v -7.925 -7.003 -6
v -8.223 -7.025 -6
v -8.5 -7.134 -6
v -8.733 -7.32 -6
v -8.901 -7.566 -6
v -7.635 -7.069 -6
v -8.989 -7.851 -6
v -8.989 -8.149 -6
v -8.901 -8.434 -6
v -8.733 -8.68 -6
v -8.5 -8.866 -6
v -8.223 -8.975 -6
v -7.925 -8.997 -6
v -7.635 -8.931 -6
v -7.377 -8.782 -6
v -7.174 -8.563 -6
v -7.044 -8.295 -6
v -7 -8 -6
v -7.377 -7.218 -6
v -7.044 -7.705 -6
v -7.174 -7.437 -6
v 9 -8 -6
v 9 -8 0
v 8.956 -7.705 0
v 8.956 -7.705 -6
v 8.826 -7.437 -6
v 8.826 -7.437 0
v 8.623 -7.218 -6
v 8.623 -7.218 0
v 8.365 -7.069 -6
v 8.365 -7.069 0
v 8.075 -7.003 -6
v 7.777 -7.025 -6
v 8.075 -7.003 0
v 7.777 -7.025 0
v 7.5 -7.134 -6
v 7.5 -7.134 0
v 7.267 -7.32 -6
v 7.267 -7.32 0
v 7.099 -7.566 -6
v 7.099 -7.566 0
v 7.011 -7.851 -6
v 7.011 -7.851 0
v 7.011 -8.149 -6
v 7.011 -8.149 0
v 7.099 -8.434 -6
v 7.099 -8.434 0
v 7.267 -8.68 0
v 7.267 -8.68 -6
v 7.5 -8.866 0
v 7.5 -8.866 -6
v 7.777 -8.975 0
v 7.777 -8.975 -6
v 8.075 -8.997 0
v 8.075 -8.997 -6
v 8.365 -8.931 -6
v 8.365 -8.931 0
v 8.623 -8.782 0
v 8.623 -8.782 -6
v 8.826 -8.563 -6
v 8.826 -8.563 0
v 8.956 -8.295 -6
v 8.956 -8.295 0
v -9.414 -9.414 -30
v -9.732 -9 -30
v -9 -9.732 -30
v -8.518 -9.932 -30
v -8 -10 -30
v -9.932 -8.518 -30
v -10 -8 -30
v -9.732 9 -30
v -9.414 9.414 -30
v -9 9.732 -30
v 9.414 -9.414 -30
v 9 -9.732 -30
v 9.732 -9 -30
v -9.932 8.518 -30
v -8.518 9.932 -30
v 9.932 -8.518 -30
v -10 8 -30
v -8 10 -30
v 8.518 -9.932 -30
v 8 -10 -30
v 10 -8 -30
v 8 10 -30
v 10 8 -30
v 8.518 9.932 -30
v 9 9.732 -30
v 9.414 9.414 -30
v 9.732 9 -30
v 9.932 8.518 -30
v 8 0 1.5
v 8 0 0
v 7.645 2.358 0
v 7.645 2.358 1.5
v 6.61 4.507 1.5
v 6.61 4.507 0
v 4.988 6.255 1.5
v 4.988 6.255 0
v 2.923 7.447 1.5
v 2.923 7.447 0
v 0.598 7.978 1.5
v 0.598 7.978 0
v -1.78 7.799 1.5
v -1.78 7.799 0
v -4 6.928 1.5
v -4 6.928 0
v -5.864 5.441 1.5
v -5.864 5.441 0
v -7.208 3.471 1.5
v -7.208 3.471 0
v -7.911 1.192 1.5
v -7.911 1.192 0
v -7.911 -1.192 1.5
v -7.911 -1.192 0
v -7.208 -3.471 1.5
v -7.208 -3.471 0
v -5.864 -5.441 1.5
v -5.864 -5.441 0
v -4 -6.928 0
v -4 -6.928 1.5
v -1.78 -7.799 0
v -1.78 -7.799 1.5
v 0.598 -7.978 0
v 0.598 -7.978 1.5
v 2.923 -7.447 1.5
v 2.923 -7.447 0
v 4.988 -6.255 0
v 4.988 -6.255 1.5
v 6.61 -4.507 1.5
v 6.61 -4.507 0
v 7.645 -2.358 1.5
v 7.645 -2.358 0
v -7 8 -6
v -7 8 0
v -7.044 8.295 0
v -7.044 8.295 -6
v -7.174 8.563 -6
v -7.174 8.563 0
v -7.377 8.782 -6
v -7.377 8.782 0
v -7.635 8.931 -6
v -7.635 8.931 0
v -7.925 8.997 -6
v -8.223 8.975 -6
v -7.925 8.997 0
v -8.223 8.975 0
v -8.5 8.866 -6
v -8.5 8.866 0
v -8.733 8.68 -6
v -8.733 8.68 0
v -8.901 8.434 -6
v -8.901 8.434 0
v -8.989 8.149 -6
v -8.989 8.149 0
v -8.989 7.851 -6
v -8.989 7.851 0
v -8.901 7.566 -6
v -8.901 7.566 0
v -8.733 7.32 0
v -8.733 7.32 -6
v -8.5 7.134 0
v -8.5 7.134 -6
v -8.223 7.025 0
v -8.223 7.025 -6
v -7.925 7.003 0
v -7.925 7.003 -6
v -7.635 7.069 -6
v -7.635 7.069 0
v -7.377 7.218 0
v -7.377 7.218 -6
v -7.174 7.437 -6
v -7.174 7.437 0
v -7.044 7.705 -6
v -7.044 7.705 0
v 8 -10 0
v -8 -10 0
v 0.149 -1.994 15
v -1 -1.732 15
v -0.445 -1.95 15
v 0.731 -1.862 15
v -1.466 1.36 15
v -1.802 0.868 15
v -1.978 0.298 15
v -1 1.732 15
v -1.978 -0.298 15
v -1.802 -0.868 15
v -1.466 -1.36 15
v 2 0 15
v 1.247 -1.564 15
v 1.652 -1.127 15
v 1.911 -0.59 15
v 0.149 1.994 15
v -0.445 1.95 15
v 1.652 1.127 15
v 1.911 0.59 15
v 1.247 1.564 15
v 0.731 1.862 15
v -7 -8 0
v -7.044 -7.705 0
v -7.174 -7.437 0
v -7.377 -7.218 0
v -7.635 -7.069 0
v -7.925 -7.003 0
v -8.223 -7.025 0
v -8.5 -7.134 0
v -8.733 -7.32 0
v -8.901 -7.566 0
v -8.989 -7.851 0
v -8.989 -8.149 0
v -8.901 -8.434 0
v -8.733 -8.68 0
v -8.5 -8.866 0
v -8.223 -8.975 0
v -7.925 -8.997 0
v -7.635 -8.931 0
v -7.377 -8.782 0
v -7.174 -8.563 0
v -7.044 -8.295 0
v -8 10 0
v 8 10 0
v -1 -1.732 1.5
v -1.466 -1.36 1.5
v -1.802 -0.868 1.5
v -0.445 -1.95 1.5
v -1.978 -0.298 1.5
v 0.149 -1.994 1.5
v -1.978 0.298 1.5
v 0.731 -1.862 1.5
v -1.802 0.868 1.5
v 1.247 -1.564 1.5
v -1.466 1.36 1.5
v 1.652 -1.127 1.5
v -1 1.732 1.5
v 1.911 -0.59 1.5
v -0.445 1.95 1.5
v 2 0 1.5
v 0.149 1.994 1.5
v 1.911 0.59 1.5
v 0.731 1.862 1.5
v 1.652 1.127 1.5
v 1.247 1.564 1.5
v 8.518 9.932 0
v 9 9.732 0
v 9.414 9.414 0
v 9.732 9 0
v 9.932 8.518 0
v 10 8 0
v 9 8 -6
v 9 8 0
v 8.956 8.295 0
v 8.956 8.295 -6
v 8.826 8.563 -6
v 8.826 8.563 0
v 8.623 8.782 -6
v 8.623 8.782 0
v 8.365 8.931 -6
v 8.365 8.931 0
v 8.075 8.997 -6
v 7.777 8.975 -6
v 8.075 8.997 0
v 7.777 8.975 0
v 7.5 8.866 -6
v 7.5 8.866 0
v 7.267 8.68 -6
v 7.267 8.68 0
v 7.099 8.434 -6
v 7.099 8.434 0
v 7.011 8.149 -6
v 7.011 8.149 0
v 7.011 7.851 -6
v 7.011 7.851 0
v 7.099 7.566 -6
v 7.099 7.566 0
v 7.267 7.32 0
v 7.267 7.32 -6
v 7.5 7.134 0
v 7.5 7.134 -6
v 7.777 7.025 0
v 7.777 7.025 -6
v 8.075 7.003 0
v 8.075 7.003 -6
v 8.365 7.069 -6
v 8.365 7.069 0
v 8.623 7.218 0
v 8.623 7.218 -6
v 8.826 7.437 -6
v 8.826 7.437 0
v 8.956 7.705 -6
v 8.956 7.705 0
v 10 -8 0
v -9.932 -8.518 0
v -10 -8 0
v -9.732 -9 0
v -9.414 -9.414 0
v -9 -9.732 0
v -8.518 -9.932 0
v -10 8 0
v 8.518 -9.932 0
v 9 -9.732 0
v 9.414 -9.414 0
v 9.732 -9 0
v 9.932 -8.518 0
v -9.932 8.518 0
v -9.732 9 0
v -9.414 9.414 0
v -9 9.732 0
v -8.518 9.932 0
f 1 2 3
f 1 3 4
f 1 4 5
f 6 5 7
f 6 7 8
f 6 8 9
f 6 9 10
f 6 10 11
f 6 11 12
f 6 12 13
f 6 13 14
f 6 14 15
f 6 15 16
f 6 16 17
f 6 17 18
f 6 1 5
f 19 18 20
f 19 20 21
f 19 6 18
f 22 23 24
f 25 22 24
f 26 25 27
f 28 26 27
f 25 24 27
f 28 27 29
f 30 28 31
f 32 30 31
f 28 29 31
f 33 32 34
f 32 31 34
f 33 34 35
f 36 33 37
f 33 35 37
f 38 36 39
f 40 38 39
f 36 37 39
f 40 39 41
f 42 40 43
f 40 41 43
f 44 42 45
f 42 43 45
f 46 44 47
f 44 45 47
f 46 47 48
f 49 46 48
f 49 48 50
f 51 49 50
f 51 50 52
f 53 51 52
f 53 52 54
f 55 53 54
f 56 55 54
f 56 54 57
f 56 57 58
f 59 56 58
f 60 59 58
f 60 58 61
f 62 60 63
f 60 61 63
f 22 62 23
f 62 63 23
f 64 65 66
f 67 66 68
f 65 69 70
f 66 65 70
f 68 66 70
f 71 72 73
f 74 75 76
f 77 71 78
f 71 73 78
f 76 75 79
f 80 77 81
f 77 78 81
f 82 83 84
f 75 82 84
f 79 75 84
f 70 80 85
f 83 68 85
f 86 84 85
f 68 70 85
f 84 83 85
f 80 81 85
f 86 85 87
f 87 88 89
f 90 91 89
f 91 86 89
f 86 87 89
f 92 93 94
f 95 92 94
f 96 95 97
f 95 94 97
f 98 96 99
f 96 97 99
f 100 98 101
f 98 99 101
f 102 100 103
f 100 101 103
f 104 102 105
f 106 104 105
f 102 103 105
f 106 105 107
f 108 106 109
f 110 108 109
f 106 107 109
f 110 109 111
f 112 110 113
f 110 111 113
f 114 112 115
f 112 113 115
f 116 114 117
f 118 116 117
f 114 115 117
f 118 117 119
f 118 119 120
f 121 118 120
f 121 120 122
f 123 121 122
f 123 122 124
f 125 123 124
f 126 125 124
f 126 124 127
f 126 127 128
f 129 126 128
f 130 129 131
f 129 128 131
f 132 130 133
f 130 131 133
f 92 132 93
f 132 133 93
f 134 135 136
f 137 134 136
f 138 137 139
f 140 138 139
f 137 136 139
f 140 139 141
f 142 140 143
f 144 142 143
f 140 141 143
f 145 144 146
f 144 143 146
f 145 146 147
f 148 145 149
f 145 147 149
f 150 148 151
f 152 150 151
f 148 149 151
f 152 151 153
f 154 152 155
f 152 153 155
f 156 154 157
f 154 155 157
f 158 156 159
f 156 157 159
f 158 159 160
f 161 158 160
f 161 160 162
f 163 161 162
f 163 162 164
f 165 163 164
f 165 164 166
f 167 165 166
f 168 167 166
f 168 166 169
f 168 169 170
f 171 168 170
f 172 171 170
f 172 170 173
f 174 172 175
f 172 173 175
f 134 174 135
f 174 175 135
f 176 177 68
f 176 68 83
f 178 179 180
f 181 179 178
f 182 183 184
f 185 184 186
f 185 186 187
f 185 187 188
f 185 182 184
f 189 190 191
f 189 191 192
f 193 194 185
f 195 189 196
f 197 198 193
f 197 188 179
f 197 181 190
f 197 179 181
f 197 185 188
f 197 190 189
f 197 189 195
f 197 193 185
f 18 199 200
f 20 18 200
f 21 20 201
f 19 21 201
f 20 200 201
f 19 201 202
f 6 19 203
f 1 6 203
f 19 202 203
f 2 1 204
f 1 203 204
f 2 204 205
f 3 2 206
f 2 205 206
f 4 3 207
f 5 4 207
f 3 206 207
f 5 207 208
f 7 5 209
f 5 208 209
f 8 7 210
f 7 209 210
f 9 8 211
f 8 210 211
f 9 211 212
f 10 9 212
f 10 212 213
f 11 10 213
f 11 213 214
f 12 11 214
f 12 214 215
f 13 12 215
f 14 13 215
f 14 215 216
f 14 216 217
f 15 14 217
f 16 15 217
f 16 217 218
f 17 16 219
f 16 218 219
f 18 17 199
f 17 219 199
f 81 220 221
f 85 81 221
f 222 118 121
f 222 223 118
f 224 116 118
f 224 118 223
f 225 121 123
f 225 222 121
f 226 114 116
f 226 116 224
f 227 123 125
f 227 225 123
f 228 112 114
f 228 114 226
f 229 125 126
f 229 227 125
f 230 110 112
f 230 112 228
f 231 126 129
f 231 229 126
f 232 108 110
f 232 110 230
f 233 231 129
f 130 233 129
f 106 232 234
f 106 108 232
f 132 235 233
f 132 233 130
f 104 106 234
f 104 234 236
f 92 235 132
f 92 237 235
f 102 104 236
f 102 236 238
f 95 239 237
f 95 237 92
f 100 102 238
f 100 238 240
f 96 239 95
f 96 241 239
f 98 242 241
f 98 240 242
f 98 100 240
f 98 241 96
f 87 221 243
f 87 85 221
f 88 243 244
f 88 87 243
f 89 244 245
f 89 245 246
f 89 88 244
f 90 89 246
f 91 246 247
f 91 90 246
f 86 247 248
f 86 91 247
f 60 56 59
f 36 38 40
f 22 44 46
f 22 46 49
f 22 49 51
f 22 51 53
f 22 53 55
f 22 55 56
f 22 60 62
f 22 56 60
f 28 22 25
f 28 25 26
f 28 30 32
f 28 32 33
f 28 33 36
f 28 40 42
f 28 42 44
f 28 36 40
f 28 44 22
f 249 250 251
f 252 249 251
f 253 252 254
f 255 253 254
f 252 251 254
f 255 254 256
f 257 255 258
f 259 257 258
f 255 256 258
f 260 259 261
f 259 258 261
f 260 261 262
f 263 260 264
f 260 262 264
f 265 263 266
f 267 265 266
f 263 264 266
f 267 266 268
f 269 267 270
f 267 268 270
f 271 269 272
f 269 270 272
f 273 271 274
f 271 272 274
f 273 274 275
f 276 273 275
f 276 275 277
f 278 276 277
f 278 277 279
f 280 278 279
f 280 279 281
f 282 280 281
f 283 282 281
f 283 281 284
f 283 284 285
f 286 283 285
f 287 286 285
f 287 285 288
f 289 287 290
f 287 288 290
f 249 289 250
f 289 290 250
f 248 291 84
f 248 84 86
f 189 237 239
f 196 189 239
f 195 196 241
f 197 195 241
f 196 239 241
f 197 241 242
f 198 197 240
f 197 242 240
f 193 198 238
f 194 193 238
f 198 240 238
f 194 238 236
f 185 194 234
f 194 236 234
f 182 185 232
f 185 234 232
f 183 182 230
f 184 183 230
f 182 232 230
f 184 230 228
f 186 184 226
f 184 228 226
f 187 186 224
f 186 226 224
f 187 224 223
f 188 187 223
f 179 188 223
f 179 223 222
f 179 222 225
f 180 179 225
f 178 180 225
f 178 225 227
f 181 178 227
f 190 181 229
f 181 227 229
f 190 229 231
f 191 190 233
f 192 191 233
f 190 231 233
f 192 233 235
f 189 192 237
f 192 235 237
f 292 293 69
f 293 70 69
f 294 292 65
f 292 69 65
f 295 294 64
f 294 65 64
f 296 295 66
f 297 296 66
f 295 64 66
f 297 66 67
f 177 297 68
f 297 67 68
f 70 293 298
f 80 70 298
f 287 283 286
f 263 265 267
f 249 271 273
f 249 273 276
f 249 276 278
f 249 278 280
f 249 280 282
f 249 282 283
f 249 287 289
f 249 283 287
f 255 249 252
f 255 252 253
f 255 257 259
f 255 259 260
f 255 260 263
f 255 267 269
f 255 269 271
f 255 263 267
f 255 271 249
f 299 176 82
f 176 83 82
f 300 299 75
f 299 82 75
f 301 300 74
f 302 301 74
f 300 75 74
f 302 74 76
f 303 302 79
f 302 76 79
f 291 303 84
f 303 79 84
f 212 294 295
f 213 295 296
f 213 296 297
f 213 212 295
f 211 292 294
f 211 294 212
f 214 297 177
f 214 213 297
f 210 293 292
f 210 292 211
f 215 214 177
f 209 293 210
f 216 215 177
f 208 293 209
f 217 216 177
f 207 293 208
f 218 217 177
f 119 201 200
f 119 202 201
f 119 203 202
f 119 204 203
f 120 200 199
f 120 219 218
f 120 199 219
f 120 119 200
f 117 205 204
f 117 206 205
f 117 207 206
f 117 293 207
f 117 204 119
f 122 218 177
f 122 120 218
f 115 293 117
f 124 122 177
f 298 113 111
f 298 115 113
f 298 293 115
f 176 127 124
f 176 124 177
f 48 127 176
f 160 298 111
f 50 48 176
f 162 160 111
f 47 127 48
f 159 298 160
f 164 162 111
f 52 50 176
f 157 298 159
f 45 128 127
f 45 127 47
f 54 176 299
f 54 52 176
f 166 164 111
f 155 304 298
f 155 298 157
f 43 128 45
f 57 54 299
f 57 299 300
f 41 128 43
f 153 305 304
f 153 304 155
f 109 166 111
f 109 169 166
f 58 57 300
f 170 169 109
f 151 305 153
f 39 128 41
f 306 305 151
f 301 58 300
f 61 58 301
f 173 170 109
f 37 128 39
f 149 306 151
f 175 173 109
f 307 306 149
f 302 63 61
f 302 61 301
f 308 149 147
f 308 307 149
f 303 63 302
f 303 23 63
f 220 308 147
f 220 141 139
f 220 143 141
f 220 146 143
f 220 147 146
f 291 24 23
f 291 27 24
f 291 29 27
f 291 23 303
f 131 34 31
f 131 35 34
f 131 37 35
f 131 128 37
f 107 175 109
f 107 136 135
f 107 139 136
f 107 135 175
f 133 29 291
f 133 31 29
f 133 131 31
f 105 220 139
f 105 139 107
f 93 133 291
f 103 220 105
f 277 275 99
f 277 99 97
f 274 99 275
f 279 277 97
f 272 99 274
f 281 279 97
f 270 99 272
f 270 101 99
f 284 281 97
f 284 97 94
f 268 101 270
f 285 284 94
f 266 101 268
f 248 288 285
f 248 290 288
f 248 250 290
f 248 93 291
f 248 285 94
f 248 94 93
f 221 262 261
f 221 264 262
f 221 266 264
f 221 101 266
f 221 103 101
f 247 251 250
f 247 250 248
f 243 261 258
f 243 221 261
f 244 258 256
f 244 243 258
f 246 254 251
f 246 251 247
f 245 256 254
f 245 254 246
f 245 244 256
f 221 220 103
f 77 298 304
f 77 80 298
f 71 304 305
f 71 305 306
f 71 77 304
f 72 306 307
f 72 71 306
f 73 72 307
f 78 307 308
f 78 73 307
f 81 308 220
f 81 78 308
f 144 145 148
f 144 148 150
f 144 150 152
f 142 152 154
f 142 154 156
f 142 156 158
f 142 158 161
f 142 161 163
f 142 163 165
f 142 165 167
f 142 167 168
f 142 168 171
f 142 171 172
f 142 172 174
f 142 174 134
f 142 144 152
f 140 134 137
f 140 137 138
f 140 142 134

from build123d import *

# Parameters (mm, degrees)
SKETCH1_W           = 20
SKETCH1_H           = 20
BOSS_EXTRUDE1_DEPTH = 30
SKETCH2_R           = 1
CUT_EXTRUDE1_DEPTH  = 6
FILLET1_R           = 2
SKETCH3_R           = 8
BOSS_EXTRUDE2_DEPTH = 1.5
SKETCH4_R           = 2
BOSS_EXTRUDE3_DEPTH = 13.5


with BuildPart() as part:
    # Sketch1 → Boss-Extrude1 (new body)
    with BuildSketch(Plane.XY):
        Rectangle(SKETCH1_W, SKETCH1_H)
    extrude(amount=-BOSS_EXTRUDE1_DEPTH)

    # Sketch2 → Cut-Extrude1 (cut)
    with BuildSketch(Plane.XY):
        with Locations((-8, 8)):
            Circle(SKETCH2_R)
        with Locations((8, 8)):
            Circle(SKETCH2_R)
        with Locations((8, -8)):
            Circle(SKETCH2_R)
        with Locations((-8, -8)):
            Circle(SKETCH2_R)
    extrude(amount=-CUT_EXTRUDE1_DEPTH, mode=Mode.SUBTRACT)

    # Fillet1
    fillet1_edges = [part.edges().sort_by_distance(p)[0] for p in [
        (10, -10, -15),
        (-10, -10, -15),
        (-10, 10, -15),
        (10, 10, -15),
    ]]
    fillet(fillet1_edges, radius=FILLET1_R)

    # Sketch3 → Boss-Extrude2 (add)
    with BuildSketch(Plane.XY):
        Circle(SKETCH3_R)
    extrude(amount=BOSS_EXTRUDE2_DEPTH)

    # Sketch4 → Boss-Extrude3 (add)
    with BuildSketch(Plane.XY.offset(1.5)):
        Circle(SKETCH4_R)
    extrude(amount=BOSS_EXTRUDE3_DEPTH)


solid = part.part
